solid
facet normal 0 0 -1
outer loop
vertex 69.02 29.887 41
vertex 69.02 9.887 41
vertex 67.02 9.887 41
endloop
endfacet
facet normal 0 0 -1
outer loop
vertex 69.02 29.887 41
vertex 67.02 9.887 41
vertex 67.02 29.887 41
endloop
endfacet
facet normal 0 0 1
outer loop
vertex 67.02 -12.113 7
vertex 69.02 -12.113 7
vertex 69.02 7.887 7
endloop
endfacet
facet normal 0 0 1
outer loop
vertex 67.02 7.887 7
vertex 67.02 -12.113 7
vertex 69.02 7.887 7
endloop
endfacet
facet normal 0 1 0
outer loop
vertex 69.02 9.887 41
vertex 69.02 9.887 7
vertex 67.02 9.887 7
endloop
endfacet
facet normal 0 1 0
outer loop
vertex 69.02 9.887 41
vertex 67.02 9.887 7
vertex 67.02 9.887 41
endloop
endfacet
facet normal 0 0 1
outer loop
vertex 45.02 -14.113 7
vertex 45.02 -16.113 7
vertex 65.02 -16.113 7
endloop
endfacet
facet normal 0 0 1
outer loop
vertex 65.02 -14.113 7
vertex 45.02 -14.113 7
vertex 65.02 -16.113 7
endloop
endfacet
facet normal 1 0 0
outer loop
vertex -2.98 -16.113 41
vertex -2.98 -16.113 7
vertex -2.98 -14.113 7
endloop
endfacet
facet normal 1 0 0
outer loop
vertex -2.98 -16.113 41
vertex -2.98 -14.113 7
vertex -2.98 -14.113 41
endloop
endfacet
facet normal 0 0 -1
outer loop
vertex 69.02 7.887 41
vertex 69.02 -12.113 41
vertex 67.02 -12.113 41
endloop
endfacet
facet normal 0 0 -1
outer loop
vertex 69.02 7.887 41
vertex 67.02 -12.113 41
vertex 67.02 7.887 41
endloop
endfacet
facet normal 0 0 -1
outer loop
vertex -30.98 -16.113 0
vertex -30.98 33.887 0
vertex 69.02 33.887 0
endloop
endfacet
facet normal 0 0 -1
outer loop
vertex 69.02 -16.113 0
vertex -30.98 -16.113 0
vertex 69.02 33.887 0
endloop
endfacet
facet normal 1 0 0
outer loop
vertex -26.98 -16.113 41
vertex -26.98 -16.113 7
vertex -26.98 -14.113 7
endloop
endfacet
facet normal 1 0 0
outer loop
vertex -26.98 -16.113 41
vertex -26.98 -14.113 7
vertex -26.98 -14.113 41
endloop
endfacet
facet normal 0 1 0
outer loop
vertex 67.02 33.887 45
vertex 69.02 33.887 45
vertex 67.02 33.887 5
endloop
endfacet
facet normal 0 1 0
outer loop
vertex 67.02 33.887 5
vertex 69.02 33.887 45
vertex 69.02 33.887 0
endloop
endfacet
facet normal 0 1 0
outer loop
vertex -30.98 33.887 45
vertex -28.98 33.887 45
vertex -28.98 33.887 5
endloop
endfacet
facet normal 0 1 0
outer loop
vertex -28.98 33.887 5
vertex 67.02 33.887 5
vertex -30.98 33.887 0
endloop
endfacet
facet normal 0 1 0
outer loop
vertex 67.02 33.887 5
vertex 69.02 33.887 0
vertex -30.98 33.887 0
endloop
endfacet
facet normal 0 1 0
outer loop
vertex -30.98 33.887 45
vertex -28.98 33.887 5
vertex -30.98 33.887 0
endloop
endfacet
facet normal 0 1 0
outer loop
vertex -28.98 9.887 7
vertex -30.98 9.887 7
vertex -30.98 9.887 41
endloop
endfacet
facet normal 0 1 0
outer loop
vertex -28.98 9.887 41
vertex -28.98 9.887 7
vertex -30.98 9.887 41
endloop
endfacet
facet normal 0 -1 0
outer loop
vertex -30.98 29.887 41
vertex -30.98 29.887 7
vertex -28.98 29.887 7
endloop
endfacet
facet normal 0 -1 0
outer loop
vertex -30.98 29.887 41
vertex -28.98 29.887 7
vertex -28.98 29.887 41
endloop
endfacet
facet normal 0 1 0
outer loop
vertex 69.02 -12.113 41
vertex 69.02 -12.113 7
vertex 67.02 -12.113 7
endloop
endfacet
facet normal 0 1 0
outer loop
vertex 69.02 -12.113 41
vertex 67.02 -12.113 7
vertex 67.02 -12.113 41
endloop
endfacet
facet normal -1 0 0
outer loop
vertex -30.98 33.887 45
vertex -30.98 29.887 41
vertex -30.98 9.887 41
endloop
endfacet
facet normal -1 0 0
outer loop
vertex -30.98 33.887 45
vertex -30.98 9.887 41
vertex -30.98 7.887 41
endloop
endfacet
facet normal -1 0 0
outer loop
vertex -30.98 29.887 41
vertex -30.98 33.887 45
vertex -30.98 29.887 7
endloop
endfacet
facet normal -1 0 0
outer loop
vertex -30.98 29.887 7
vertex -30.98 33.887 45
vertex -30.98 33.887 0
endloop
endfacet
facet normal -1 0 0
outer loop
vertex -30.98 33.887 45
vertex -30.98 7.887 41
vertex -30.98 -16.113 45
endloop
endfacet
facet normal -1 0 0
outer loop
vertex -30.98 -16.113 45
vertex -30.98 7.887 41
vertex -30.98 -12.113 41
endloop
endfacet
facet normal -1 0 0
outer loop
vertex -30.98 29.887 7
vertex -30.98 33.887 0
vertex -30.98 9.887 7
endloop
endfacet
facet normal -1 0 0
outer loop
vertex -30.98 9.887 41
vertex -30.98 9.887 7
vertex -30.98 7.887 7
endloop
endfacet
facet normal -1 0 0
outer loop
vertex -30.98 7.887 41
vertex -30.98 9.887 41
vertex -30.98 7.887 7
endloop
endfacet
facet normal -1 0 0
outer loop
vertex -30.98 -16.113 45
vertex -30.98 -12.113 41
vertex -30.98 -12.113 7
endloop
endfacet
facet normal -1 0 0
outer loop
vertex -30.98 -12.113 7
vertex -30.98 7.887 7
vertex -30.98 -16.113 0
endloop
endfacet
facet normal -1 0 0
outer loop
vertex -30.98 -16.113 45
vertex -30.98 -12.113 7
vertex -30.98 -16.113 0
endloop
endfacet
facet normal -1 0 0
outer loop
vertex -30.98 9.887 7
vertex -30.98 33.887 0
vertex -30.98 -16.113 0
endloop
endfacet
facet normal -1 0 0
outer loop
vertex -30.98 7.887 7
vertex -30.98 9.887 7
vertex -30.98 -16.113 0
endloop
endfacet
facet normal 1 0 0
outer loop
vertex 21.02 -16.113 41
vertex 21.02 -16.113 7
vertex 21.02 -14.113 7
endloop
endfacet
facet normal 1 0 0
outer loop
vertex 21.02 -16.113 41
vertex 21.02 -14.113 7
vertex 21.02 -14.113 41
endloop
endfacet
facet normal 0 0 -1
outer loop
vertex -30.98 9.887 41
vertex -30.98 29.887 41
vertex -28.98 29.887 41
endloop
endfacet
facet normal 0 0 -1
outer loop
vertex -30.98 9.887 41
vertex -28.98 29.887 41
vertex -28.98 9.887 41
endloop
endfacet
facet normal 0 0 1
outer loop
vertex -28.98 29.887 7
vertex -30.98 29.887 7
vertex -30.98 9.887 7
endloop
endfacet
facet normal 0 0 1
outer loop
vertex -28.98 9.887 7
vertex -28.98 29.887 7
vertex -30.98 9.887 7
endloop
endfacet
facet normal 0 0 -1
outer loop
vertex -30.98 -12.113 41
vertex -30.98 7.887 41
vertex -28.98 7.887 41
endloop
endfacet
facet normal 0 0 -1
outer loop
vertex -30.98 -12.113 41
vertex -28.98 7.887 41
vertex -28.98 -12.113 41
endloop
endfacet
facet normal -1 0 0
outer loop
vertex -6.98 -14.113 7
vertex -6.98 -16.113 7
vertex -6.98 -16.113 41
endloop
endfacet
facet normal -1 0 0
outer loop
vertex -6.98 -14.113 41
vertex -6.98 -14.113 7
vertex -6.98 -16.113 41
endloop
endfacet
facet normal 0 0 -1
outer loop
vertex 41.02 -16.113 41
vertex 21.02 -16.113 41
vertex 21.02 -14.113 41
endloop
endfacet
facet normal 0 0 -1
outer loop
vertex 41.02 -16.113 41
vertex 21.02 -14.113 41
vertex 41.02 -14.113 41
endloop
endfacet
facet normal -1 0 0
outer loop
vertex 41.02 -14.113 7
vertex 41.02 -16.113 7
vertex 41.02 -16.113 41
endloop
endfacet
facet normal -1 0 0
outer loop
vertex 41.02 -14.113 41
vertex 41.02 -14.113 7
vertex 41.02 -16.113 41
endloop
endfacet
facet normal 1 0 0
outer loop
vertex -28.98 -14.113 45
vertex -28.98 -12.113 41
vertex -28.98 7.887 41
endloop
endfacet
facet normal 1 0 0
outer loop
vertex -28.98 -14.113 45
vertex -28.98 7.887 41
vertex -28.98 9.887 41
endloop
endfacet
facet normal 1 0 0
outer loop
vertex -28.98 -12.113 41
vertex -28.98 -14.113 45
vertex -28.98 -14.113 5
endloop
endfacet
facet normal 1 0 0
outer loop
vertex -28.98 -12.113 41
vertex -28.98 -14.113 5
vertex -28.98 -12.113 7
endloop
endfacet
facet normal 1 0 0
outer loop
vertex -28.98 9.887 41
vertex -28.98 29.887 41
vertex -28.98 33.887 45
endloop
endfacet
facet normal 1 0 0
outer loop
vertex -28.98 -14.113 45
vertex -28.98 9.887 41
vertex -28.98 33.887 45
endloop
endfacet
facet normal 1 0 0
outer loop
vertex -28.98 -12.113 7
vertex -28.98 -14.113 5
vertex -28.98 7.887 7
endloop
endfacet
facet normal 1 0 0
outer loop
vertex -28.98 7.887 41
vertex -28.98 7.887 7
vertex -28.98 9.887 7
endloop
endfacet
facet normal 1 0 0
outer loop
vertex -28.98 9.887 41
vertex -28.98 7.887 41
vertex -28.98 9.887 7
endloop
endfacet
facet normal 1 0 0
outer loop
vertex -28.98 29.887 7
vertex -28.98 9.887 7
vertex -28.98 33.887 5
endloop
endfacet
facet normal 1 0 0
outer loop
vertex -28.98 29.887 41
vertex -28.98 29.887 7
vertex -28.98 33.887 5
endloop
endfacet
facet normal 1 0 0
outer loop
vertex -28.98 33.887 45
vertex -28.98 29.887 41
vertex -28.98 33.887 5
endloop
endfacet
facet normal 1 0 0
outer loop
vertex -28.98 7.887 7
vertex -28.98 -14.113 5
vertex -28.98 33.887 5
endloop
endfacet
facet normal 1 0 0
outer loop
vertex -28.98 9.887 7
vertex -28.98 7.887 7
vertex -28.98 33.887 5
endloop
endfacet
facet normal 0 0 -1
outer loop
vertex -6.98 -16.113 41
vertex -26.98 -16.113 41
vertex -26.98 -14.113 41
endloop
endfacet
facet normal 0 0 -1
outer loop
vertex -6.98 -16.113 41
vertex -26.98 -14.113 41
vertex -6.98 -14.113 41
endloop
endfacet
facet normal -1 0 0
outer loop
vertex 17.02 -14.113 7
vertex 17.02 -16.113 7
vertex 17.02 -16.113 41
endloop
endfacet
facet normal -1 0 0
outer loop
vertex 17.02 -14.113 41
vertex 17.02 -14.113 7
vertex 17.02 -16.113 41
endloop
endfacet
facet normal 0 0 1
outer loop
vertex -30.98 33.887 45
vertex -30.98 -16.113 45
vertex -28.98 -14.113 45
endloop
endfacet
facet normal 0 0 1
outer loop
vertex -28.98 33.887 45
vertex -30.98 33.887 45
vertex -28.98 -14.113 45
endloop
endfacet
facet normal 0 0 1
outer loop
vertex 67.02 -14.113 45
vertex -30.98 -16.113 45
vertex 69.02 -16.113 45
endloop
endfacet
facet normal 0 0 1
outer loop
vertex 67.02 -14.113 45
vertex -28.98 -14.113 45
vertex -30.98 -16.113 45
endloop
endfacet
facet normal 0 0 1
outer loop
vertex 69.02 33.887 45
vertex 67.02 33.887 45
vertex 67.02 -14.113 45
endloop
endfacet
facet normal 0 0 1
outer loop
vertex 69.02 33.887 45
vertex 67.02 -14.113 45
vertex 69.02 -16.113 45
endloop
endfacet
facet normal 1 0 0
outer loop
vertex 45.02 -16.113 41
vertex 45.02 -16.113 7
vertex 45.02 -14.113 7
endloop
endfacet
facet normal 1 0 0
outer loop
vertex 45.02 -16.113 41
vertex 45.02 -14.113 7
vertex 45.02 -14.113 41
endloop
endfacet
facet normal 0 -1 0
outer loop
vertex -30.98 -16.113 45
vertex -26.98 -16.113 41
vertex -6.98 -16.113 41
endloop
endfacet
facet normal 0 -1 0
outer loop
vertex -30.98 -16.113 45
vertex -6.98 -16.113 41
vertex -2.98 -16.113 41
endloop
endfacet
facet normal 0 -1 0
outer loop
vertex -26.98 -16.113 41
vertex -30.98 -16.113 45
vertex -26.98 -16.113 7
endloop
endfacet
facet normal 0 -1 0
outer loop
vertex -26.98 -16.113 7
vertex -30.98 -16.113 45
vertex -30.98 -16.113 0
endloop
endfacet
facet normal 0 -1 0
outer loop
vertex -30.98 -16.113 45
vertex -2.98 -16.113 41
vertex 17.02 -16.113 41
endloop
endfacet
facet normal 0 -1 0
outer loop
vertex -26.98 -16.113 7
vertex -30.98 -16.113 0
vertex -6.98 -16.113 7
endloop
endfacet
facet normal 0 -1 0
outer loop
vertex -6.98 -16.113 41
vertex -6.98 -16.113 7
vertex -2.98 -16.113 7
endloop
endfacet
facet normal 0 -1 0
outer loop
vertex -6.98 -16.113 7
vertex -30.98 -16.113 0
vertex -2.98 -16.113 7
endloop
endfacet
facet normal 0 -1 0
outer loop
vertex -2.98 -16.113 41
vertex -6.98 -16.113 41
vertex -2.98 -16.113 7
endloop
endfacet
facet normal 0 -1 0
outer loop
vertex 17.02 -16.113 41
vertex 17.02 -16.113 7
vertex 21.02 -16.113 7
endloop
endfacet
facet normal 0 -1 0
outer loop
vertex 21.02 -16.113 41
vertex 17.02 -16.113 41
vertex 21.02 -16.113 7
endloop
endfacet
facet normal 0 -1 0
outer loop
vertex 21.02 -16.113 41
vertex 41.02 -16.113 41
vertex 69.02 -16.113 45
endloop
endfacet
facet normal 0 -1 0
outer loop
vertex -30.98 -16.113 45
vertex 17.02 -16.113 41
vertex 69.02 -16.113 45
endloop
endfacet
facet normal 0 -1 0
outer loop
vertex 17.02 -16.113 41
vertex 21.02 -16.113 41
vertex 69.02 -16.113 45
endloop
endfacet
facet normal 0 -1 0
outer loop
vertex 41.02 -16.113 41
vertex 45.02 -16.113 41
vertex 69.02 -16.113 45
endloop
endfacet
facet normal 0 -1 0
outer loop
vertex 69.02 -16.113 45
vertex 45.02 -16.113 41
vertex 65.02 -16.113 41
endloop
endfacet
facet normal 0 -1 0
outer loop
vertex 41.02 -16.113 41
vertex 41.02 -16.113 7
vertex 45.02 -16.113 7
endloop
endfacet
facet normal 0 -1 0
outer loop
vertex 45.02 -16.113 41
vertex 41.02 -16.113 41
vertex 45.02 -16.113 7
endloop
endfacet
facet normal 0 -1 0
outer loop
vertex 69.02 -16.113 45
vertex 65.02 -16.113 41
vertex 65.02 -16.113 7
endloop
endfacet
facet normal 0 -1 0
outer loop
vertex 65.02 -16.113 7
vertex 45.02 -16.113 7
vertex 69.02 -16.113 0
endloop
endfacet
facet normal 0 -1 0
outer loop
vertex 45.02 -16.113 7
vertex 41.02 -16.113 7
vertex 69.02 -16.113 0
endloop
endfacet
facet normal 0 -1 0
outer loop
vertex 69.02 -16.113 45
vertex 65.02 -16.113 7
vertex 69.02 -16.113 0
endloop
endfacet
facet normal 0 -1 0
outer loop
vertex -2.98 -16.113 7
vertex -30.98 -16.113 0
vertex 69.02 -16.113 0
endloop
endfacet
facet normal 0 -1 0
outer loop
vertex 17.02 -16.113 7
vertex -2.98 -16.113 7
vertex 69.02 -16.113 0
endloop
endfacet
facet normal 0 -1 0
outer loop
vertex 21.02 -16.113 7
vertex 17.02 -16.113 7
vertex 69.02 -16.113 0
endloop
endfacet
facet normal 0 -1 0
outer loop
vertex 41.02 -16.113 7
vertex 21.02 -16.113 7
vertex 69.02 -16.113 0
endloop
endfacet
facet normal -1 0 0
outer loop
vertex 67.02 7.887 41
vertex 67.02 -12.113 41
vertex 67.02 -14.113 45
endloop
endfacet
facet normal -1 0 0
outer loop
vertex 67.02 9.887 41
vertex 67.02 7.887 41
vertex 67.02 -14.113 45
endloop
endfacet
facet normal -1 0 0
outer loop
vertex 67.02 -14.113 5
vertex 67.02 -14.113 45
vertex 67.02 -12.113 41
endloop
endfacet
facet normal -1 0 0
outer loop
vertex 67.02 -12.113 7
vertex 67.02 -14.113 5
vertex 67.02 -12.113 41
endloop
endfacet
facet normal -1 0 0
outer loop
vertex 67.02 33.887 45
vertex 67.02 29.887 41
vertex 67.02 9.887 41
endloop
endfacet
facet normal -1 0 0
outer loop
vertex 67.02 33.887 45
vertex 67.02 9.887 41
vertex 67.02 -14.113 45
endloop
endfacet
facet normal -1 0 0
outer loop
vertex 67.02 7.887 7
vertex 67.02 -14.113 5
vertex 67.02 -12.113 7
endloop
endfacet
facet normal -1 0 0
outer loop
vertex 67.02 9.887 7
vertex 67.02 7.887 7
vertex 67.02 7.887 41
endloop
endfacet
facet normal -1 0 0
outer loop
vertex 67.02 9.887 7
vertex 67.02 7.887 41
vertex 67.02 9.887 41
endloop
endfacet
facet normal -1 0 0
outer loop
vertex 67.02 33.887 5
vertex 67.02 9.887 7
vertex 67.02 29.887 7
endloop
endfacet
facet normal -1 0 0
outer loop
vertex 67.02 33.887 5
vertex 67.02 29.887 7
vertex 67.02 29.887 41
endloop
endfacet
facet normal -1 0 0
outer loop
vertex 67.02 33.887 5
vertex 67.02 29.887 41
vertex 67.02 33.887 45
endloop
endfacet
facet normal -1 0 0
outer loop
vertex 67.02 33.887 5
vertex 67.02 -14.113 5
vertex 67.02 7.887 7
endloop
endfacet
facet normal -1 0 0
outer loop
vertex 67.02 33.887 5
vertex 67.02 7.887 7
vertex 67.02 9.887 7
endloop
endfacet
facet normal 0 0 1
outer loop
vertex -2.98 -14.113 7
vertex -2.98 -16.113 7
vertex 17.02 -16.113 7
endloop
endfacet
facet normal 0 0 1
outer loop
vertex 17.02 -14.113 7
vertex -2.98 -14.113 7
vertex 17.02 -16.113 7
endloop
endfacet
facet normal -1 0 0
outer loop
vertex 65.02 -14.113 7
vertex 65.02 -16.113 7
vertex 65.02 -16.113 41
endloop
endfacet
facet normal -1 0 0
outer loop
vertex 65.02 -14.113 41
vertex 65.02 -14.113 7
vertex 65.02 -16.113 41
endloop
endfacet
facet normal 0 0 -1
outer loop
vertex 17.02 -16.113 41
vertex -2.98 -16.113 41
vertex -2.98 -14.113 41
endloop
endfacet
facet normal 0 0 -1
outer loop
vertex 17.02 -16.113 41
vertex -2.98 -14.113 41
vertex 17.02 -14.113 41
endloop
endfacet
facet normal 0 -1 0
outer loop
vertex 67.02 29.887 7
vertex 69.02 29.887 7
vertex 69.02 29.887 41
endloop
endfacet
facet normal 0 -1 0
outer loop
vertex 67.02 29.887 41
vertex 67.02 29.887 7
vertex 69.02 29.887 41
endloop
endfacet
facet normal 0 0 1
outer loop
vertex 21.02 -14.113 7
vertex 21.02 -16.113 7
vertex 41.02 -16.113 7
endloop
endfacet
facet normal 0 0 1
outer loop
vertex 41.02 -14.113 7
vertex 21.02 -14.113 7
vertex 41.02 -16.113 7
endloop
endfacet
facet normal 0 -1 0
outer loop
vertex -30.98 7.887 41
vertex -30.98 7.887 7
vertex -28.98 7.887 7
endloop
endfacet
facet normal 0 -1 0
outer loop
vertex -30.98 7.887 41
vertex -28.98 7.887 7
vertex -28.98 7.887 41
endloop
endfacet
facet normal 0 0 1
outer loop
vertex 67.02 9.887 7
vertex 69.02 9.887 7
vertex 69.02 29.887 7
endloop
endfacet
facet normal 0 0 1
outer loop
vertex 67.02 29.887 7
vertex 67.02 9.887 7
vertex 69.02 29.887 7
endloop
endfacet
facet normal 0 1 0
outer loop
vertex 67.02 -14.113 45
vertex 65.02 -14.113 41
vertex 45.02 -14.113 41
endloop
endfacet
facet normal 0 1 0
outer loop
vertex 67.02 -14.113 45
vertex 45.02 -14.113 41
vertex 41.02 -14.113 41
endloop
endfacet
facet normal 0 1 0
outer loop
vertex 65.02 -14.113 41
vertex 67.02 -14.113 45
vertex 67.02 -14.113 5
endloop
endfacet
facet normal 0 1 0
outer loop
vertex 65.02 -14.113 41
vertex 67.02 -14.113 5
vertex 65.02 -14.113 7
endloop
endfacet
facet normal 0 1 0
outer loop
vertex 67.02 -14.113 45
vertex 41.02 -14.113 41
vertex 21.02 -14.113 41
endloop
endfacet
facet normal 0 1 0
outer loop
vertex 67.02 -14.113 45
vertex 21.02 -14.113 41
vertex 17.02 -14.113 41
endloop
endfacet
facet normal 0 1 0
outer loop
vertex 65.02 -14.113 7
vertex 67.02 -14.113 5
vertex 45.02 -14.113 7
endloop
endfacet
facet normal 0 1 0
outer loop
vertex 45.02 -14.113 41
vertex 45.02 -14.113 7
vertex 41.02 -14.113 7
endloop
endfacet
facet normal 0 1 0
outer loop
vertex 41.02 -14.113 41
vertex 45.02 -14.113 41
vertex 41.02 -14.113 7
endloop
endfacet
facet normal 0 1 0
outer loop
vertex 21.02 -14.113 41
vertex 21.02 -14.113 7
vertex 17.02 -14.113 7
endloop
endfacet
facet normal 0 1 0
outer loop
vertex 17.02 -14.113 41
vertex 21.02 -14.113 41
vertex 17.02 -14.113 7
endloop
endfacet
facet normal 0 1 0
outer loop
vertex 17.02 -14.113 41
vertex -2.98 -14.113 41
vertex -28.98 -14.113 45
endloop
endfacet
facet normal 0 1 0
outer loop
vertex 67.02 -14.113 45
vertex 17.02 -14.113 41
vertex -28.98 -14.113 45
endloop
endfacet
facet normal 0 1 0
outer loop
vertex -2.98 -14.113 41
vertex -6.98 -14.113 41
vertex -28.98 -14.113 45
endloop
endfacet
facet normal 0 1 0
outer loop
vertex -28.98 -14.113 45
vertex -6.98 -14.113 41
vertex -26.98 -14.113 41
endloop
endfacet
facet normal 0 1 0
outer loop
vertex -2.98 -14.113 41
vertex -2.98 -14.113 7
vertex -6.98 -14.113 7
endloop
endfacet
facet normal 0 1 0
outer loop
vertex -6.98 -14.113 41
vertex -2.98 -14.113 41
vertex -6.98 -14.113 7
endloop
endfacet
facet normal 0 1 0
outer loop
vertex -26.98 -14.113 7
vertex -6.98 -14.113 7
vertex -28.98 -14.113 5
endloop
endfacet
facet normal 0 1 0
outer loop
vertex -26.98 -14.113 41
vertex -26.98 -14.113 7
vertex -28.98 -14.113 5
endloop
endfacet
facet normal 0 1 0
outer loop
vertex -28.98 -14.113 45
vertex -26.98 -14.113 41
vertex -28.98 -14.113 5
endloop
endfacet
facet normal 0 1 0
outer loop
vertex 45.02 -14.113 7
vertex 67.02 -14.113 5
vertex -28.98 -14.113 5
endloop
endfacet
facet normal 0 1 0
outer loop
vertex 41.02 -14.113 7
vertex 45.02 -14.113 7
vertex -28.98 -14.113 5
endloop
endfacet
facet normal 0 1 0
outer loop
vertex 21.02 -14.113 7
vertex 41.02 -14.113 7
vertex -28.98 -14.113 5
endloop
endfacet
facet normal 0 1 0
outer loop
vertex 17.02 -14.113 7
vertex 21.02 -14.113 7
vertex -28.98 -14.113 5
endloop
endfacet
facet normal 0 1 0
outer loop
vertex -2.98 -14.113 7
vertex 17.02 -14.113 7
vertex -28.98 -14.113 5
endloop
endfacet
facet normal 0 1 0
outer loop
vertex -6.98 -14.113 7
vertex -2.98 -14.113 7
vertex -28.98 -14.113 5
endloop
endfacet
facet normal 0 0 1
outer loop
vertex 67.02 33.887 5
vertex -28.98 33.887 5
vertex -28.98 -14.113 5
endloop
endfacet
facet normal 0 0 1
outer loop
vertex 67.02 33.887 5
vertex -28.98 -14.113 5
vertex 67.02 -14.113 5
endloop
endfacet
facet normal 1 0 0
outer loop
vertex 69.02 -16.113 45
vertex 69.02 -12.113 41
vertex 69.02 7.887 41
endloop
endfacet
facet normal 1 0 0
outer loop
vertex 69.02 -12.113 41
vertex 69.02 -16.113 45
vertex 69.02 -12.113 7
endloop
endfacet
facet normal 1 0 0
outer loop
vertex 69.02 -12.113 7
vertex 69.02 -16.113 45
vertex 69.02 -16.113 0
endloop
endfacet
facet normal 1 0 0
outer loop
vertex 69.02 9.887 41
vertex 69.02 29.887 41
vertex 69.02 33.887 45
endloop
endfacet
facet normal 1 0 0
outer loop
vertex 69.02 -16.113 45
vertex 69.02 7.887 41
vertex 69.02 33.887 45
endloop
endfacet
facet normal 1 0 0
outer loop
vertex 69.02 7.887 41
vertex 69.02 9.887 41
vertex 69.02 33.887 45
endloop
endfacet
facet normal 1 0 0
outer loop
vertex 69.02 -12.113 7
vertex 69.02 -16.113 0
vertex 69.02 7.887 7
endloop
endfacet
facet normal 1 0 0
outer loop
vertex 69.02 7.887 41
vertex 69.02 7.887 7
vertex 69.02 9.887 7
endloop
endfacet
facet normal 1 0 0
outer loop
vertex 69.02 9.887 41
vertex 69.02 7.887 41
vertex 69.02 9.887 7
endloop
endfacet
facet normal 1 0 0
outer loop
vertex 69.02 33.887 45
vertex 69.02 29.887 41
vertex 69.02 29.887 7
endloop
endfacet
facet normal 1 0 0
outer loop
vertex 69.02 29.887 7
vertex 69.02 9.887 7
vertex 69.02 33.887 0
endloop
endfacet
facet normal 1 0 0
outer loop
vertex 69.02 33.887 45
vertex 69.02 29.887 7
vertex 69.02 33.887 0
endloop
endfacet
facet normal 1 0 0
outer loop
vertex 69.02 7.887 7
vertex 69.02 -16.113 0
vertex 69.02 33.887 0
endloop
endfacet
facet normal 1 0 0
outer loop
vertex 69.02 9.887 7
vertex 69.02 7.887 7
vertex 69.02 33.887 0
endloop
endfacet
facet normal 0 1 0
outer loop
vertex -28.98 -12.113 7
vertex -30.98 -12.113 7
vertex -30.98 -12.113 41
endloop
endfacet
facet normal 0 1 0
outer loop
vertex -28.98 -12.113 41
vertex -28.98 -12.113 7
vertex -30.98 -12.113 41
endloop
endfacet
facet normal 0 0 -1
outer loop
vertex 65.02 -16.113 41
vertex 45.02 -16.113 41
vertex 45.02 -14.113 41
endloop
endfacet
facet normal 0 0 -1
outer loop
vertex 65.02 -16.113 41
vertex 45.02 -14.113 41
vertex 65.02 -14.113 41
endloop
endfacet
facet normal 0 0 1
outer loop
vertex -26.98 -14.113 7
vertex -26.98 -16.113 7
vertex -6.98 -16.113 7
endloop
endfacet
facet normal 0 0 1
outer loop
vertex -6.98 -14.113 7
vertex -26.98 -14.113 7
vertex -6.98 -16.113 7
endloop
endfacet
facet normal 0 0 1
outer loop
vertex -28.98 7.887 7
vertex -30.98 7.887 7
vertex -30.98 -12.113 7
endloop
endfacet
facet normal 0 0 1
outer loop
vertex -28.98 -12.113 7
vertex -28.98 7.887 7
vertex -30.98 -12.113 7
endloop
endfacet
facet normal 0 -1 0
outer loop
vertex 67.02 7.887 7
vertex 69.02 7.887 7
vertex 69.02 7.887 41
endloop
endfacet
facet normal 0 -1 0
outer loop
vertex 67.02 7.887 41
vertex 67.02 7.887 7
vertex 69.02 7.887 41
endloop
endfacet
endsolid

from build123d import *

# Parameters (mm, degrees)
F0_W     = 100
F0_H     = 50
F1_DEPTH = 5
F2_W     = 2
F2_H     = 48
F3_DEPTH = 40
F4_W     = 20
F4_H     = 34
F5_DEPTH = 5
F6_W     = 20
F6_H     = 34
F7_DEPTH = 5
F8_W     = 20
F8_H     = 34
F9_DEPTH = 5


with BuildPart() as f1:
    # F0 (on Top) → F1 (new body)
    with BuildSketch(Plane.XY):
        with Locations((19.01981, 8.886849)):
            Rectangle(F0_W, F0_H)
    extrude(amount=F1_DEPTH)

    # F2 (on face) → F3 (join)
    with BuildSketch(Plane.XY.offset(5)):
        Polygon((-28.98019, 33.886849), (-30.98019, 33.886849), (-30.98019, -16.113151), (-28.98019, -16.113151), (-28.98019, -14.113151), align=None)
        Polygon((67.01981, -14.113151), (-28.98019, -14.113151), (-28.98019, -16.113151), (69.01981, -16.113151), (69.01981, -14.113151), align=None)
        with Locations((68.01981, 9.886849)):
            Rectangle(F2_W, F2_H)
    extrude(amount=F3_DEPTH)

    # F4 (on face) → F5 (cut)
    with BuildSketch(Plane.XZ.offset(16.113151)):
        with Locations((-16.98019, 24)):
            Rectangle(F4_W, F4_H)
        with Locations((7.01981, 24)):
            Rectangle(F4_W, F4_H)
        with Locations((31.01981, 24)):
            Rectangle(F4_W, F4_H)
        with Locations((55.01981, 24)):
            Rectangle(F4_W, F4_H)
    extrude(amount=-F5_DEPTH, mode=Mode.SUBTRACT)

    # F6 (on face) → F7 (cut)
    with BuildSketch(Plane(origin=(-30.98019, 0, 0), x_dir=(0, -1, 0), z_dir=(-1, 0, 0))):
        with Locations((-19.886849, 24)):
            Rectangle(F6_W, F6_H)
        with Locations((2.113151, 24)):
            Rectangle(F6_W, F6_H)
    extrude(amount=-F7_DEPTH, mode=Mode.SUBTRACT)

    # F8 (on face) → F9 (cut)
    with BuildSketch(Plane.YZ.offset(69.01981)):
        with Locations((-2.113151, 24)):
            Rectangle(F8_W, F8_H)
        with Locations((19.886849, 24)):
            Rectangle(F8_W, F8_H)
    extrude(amount=-F9_DEPTH, mode=Mode.SUBTRACT)


solid = f1.part
